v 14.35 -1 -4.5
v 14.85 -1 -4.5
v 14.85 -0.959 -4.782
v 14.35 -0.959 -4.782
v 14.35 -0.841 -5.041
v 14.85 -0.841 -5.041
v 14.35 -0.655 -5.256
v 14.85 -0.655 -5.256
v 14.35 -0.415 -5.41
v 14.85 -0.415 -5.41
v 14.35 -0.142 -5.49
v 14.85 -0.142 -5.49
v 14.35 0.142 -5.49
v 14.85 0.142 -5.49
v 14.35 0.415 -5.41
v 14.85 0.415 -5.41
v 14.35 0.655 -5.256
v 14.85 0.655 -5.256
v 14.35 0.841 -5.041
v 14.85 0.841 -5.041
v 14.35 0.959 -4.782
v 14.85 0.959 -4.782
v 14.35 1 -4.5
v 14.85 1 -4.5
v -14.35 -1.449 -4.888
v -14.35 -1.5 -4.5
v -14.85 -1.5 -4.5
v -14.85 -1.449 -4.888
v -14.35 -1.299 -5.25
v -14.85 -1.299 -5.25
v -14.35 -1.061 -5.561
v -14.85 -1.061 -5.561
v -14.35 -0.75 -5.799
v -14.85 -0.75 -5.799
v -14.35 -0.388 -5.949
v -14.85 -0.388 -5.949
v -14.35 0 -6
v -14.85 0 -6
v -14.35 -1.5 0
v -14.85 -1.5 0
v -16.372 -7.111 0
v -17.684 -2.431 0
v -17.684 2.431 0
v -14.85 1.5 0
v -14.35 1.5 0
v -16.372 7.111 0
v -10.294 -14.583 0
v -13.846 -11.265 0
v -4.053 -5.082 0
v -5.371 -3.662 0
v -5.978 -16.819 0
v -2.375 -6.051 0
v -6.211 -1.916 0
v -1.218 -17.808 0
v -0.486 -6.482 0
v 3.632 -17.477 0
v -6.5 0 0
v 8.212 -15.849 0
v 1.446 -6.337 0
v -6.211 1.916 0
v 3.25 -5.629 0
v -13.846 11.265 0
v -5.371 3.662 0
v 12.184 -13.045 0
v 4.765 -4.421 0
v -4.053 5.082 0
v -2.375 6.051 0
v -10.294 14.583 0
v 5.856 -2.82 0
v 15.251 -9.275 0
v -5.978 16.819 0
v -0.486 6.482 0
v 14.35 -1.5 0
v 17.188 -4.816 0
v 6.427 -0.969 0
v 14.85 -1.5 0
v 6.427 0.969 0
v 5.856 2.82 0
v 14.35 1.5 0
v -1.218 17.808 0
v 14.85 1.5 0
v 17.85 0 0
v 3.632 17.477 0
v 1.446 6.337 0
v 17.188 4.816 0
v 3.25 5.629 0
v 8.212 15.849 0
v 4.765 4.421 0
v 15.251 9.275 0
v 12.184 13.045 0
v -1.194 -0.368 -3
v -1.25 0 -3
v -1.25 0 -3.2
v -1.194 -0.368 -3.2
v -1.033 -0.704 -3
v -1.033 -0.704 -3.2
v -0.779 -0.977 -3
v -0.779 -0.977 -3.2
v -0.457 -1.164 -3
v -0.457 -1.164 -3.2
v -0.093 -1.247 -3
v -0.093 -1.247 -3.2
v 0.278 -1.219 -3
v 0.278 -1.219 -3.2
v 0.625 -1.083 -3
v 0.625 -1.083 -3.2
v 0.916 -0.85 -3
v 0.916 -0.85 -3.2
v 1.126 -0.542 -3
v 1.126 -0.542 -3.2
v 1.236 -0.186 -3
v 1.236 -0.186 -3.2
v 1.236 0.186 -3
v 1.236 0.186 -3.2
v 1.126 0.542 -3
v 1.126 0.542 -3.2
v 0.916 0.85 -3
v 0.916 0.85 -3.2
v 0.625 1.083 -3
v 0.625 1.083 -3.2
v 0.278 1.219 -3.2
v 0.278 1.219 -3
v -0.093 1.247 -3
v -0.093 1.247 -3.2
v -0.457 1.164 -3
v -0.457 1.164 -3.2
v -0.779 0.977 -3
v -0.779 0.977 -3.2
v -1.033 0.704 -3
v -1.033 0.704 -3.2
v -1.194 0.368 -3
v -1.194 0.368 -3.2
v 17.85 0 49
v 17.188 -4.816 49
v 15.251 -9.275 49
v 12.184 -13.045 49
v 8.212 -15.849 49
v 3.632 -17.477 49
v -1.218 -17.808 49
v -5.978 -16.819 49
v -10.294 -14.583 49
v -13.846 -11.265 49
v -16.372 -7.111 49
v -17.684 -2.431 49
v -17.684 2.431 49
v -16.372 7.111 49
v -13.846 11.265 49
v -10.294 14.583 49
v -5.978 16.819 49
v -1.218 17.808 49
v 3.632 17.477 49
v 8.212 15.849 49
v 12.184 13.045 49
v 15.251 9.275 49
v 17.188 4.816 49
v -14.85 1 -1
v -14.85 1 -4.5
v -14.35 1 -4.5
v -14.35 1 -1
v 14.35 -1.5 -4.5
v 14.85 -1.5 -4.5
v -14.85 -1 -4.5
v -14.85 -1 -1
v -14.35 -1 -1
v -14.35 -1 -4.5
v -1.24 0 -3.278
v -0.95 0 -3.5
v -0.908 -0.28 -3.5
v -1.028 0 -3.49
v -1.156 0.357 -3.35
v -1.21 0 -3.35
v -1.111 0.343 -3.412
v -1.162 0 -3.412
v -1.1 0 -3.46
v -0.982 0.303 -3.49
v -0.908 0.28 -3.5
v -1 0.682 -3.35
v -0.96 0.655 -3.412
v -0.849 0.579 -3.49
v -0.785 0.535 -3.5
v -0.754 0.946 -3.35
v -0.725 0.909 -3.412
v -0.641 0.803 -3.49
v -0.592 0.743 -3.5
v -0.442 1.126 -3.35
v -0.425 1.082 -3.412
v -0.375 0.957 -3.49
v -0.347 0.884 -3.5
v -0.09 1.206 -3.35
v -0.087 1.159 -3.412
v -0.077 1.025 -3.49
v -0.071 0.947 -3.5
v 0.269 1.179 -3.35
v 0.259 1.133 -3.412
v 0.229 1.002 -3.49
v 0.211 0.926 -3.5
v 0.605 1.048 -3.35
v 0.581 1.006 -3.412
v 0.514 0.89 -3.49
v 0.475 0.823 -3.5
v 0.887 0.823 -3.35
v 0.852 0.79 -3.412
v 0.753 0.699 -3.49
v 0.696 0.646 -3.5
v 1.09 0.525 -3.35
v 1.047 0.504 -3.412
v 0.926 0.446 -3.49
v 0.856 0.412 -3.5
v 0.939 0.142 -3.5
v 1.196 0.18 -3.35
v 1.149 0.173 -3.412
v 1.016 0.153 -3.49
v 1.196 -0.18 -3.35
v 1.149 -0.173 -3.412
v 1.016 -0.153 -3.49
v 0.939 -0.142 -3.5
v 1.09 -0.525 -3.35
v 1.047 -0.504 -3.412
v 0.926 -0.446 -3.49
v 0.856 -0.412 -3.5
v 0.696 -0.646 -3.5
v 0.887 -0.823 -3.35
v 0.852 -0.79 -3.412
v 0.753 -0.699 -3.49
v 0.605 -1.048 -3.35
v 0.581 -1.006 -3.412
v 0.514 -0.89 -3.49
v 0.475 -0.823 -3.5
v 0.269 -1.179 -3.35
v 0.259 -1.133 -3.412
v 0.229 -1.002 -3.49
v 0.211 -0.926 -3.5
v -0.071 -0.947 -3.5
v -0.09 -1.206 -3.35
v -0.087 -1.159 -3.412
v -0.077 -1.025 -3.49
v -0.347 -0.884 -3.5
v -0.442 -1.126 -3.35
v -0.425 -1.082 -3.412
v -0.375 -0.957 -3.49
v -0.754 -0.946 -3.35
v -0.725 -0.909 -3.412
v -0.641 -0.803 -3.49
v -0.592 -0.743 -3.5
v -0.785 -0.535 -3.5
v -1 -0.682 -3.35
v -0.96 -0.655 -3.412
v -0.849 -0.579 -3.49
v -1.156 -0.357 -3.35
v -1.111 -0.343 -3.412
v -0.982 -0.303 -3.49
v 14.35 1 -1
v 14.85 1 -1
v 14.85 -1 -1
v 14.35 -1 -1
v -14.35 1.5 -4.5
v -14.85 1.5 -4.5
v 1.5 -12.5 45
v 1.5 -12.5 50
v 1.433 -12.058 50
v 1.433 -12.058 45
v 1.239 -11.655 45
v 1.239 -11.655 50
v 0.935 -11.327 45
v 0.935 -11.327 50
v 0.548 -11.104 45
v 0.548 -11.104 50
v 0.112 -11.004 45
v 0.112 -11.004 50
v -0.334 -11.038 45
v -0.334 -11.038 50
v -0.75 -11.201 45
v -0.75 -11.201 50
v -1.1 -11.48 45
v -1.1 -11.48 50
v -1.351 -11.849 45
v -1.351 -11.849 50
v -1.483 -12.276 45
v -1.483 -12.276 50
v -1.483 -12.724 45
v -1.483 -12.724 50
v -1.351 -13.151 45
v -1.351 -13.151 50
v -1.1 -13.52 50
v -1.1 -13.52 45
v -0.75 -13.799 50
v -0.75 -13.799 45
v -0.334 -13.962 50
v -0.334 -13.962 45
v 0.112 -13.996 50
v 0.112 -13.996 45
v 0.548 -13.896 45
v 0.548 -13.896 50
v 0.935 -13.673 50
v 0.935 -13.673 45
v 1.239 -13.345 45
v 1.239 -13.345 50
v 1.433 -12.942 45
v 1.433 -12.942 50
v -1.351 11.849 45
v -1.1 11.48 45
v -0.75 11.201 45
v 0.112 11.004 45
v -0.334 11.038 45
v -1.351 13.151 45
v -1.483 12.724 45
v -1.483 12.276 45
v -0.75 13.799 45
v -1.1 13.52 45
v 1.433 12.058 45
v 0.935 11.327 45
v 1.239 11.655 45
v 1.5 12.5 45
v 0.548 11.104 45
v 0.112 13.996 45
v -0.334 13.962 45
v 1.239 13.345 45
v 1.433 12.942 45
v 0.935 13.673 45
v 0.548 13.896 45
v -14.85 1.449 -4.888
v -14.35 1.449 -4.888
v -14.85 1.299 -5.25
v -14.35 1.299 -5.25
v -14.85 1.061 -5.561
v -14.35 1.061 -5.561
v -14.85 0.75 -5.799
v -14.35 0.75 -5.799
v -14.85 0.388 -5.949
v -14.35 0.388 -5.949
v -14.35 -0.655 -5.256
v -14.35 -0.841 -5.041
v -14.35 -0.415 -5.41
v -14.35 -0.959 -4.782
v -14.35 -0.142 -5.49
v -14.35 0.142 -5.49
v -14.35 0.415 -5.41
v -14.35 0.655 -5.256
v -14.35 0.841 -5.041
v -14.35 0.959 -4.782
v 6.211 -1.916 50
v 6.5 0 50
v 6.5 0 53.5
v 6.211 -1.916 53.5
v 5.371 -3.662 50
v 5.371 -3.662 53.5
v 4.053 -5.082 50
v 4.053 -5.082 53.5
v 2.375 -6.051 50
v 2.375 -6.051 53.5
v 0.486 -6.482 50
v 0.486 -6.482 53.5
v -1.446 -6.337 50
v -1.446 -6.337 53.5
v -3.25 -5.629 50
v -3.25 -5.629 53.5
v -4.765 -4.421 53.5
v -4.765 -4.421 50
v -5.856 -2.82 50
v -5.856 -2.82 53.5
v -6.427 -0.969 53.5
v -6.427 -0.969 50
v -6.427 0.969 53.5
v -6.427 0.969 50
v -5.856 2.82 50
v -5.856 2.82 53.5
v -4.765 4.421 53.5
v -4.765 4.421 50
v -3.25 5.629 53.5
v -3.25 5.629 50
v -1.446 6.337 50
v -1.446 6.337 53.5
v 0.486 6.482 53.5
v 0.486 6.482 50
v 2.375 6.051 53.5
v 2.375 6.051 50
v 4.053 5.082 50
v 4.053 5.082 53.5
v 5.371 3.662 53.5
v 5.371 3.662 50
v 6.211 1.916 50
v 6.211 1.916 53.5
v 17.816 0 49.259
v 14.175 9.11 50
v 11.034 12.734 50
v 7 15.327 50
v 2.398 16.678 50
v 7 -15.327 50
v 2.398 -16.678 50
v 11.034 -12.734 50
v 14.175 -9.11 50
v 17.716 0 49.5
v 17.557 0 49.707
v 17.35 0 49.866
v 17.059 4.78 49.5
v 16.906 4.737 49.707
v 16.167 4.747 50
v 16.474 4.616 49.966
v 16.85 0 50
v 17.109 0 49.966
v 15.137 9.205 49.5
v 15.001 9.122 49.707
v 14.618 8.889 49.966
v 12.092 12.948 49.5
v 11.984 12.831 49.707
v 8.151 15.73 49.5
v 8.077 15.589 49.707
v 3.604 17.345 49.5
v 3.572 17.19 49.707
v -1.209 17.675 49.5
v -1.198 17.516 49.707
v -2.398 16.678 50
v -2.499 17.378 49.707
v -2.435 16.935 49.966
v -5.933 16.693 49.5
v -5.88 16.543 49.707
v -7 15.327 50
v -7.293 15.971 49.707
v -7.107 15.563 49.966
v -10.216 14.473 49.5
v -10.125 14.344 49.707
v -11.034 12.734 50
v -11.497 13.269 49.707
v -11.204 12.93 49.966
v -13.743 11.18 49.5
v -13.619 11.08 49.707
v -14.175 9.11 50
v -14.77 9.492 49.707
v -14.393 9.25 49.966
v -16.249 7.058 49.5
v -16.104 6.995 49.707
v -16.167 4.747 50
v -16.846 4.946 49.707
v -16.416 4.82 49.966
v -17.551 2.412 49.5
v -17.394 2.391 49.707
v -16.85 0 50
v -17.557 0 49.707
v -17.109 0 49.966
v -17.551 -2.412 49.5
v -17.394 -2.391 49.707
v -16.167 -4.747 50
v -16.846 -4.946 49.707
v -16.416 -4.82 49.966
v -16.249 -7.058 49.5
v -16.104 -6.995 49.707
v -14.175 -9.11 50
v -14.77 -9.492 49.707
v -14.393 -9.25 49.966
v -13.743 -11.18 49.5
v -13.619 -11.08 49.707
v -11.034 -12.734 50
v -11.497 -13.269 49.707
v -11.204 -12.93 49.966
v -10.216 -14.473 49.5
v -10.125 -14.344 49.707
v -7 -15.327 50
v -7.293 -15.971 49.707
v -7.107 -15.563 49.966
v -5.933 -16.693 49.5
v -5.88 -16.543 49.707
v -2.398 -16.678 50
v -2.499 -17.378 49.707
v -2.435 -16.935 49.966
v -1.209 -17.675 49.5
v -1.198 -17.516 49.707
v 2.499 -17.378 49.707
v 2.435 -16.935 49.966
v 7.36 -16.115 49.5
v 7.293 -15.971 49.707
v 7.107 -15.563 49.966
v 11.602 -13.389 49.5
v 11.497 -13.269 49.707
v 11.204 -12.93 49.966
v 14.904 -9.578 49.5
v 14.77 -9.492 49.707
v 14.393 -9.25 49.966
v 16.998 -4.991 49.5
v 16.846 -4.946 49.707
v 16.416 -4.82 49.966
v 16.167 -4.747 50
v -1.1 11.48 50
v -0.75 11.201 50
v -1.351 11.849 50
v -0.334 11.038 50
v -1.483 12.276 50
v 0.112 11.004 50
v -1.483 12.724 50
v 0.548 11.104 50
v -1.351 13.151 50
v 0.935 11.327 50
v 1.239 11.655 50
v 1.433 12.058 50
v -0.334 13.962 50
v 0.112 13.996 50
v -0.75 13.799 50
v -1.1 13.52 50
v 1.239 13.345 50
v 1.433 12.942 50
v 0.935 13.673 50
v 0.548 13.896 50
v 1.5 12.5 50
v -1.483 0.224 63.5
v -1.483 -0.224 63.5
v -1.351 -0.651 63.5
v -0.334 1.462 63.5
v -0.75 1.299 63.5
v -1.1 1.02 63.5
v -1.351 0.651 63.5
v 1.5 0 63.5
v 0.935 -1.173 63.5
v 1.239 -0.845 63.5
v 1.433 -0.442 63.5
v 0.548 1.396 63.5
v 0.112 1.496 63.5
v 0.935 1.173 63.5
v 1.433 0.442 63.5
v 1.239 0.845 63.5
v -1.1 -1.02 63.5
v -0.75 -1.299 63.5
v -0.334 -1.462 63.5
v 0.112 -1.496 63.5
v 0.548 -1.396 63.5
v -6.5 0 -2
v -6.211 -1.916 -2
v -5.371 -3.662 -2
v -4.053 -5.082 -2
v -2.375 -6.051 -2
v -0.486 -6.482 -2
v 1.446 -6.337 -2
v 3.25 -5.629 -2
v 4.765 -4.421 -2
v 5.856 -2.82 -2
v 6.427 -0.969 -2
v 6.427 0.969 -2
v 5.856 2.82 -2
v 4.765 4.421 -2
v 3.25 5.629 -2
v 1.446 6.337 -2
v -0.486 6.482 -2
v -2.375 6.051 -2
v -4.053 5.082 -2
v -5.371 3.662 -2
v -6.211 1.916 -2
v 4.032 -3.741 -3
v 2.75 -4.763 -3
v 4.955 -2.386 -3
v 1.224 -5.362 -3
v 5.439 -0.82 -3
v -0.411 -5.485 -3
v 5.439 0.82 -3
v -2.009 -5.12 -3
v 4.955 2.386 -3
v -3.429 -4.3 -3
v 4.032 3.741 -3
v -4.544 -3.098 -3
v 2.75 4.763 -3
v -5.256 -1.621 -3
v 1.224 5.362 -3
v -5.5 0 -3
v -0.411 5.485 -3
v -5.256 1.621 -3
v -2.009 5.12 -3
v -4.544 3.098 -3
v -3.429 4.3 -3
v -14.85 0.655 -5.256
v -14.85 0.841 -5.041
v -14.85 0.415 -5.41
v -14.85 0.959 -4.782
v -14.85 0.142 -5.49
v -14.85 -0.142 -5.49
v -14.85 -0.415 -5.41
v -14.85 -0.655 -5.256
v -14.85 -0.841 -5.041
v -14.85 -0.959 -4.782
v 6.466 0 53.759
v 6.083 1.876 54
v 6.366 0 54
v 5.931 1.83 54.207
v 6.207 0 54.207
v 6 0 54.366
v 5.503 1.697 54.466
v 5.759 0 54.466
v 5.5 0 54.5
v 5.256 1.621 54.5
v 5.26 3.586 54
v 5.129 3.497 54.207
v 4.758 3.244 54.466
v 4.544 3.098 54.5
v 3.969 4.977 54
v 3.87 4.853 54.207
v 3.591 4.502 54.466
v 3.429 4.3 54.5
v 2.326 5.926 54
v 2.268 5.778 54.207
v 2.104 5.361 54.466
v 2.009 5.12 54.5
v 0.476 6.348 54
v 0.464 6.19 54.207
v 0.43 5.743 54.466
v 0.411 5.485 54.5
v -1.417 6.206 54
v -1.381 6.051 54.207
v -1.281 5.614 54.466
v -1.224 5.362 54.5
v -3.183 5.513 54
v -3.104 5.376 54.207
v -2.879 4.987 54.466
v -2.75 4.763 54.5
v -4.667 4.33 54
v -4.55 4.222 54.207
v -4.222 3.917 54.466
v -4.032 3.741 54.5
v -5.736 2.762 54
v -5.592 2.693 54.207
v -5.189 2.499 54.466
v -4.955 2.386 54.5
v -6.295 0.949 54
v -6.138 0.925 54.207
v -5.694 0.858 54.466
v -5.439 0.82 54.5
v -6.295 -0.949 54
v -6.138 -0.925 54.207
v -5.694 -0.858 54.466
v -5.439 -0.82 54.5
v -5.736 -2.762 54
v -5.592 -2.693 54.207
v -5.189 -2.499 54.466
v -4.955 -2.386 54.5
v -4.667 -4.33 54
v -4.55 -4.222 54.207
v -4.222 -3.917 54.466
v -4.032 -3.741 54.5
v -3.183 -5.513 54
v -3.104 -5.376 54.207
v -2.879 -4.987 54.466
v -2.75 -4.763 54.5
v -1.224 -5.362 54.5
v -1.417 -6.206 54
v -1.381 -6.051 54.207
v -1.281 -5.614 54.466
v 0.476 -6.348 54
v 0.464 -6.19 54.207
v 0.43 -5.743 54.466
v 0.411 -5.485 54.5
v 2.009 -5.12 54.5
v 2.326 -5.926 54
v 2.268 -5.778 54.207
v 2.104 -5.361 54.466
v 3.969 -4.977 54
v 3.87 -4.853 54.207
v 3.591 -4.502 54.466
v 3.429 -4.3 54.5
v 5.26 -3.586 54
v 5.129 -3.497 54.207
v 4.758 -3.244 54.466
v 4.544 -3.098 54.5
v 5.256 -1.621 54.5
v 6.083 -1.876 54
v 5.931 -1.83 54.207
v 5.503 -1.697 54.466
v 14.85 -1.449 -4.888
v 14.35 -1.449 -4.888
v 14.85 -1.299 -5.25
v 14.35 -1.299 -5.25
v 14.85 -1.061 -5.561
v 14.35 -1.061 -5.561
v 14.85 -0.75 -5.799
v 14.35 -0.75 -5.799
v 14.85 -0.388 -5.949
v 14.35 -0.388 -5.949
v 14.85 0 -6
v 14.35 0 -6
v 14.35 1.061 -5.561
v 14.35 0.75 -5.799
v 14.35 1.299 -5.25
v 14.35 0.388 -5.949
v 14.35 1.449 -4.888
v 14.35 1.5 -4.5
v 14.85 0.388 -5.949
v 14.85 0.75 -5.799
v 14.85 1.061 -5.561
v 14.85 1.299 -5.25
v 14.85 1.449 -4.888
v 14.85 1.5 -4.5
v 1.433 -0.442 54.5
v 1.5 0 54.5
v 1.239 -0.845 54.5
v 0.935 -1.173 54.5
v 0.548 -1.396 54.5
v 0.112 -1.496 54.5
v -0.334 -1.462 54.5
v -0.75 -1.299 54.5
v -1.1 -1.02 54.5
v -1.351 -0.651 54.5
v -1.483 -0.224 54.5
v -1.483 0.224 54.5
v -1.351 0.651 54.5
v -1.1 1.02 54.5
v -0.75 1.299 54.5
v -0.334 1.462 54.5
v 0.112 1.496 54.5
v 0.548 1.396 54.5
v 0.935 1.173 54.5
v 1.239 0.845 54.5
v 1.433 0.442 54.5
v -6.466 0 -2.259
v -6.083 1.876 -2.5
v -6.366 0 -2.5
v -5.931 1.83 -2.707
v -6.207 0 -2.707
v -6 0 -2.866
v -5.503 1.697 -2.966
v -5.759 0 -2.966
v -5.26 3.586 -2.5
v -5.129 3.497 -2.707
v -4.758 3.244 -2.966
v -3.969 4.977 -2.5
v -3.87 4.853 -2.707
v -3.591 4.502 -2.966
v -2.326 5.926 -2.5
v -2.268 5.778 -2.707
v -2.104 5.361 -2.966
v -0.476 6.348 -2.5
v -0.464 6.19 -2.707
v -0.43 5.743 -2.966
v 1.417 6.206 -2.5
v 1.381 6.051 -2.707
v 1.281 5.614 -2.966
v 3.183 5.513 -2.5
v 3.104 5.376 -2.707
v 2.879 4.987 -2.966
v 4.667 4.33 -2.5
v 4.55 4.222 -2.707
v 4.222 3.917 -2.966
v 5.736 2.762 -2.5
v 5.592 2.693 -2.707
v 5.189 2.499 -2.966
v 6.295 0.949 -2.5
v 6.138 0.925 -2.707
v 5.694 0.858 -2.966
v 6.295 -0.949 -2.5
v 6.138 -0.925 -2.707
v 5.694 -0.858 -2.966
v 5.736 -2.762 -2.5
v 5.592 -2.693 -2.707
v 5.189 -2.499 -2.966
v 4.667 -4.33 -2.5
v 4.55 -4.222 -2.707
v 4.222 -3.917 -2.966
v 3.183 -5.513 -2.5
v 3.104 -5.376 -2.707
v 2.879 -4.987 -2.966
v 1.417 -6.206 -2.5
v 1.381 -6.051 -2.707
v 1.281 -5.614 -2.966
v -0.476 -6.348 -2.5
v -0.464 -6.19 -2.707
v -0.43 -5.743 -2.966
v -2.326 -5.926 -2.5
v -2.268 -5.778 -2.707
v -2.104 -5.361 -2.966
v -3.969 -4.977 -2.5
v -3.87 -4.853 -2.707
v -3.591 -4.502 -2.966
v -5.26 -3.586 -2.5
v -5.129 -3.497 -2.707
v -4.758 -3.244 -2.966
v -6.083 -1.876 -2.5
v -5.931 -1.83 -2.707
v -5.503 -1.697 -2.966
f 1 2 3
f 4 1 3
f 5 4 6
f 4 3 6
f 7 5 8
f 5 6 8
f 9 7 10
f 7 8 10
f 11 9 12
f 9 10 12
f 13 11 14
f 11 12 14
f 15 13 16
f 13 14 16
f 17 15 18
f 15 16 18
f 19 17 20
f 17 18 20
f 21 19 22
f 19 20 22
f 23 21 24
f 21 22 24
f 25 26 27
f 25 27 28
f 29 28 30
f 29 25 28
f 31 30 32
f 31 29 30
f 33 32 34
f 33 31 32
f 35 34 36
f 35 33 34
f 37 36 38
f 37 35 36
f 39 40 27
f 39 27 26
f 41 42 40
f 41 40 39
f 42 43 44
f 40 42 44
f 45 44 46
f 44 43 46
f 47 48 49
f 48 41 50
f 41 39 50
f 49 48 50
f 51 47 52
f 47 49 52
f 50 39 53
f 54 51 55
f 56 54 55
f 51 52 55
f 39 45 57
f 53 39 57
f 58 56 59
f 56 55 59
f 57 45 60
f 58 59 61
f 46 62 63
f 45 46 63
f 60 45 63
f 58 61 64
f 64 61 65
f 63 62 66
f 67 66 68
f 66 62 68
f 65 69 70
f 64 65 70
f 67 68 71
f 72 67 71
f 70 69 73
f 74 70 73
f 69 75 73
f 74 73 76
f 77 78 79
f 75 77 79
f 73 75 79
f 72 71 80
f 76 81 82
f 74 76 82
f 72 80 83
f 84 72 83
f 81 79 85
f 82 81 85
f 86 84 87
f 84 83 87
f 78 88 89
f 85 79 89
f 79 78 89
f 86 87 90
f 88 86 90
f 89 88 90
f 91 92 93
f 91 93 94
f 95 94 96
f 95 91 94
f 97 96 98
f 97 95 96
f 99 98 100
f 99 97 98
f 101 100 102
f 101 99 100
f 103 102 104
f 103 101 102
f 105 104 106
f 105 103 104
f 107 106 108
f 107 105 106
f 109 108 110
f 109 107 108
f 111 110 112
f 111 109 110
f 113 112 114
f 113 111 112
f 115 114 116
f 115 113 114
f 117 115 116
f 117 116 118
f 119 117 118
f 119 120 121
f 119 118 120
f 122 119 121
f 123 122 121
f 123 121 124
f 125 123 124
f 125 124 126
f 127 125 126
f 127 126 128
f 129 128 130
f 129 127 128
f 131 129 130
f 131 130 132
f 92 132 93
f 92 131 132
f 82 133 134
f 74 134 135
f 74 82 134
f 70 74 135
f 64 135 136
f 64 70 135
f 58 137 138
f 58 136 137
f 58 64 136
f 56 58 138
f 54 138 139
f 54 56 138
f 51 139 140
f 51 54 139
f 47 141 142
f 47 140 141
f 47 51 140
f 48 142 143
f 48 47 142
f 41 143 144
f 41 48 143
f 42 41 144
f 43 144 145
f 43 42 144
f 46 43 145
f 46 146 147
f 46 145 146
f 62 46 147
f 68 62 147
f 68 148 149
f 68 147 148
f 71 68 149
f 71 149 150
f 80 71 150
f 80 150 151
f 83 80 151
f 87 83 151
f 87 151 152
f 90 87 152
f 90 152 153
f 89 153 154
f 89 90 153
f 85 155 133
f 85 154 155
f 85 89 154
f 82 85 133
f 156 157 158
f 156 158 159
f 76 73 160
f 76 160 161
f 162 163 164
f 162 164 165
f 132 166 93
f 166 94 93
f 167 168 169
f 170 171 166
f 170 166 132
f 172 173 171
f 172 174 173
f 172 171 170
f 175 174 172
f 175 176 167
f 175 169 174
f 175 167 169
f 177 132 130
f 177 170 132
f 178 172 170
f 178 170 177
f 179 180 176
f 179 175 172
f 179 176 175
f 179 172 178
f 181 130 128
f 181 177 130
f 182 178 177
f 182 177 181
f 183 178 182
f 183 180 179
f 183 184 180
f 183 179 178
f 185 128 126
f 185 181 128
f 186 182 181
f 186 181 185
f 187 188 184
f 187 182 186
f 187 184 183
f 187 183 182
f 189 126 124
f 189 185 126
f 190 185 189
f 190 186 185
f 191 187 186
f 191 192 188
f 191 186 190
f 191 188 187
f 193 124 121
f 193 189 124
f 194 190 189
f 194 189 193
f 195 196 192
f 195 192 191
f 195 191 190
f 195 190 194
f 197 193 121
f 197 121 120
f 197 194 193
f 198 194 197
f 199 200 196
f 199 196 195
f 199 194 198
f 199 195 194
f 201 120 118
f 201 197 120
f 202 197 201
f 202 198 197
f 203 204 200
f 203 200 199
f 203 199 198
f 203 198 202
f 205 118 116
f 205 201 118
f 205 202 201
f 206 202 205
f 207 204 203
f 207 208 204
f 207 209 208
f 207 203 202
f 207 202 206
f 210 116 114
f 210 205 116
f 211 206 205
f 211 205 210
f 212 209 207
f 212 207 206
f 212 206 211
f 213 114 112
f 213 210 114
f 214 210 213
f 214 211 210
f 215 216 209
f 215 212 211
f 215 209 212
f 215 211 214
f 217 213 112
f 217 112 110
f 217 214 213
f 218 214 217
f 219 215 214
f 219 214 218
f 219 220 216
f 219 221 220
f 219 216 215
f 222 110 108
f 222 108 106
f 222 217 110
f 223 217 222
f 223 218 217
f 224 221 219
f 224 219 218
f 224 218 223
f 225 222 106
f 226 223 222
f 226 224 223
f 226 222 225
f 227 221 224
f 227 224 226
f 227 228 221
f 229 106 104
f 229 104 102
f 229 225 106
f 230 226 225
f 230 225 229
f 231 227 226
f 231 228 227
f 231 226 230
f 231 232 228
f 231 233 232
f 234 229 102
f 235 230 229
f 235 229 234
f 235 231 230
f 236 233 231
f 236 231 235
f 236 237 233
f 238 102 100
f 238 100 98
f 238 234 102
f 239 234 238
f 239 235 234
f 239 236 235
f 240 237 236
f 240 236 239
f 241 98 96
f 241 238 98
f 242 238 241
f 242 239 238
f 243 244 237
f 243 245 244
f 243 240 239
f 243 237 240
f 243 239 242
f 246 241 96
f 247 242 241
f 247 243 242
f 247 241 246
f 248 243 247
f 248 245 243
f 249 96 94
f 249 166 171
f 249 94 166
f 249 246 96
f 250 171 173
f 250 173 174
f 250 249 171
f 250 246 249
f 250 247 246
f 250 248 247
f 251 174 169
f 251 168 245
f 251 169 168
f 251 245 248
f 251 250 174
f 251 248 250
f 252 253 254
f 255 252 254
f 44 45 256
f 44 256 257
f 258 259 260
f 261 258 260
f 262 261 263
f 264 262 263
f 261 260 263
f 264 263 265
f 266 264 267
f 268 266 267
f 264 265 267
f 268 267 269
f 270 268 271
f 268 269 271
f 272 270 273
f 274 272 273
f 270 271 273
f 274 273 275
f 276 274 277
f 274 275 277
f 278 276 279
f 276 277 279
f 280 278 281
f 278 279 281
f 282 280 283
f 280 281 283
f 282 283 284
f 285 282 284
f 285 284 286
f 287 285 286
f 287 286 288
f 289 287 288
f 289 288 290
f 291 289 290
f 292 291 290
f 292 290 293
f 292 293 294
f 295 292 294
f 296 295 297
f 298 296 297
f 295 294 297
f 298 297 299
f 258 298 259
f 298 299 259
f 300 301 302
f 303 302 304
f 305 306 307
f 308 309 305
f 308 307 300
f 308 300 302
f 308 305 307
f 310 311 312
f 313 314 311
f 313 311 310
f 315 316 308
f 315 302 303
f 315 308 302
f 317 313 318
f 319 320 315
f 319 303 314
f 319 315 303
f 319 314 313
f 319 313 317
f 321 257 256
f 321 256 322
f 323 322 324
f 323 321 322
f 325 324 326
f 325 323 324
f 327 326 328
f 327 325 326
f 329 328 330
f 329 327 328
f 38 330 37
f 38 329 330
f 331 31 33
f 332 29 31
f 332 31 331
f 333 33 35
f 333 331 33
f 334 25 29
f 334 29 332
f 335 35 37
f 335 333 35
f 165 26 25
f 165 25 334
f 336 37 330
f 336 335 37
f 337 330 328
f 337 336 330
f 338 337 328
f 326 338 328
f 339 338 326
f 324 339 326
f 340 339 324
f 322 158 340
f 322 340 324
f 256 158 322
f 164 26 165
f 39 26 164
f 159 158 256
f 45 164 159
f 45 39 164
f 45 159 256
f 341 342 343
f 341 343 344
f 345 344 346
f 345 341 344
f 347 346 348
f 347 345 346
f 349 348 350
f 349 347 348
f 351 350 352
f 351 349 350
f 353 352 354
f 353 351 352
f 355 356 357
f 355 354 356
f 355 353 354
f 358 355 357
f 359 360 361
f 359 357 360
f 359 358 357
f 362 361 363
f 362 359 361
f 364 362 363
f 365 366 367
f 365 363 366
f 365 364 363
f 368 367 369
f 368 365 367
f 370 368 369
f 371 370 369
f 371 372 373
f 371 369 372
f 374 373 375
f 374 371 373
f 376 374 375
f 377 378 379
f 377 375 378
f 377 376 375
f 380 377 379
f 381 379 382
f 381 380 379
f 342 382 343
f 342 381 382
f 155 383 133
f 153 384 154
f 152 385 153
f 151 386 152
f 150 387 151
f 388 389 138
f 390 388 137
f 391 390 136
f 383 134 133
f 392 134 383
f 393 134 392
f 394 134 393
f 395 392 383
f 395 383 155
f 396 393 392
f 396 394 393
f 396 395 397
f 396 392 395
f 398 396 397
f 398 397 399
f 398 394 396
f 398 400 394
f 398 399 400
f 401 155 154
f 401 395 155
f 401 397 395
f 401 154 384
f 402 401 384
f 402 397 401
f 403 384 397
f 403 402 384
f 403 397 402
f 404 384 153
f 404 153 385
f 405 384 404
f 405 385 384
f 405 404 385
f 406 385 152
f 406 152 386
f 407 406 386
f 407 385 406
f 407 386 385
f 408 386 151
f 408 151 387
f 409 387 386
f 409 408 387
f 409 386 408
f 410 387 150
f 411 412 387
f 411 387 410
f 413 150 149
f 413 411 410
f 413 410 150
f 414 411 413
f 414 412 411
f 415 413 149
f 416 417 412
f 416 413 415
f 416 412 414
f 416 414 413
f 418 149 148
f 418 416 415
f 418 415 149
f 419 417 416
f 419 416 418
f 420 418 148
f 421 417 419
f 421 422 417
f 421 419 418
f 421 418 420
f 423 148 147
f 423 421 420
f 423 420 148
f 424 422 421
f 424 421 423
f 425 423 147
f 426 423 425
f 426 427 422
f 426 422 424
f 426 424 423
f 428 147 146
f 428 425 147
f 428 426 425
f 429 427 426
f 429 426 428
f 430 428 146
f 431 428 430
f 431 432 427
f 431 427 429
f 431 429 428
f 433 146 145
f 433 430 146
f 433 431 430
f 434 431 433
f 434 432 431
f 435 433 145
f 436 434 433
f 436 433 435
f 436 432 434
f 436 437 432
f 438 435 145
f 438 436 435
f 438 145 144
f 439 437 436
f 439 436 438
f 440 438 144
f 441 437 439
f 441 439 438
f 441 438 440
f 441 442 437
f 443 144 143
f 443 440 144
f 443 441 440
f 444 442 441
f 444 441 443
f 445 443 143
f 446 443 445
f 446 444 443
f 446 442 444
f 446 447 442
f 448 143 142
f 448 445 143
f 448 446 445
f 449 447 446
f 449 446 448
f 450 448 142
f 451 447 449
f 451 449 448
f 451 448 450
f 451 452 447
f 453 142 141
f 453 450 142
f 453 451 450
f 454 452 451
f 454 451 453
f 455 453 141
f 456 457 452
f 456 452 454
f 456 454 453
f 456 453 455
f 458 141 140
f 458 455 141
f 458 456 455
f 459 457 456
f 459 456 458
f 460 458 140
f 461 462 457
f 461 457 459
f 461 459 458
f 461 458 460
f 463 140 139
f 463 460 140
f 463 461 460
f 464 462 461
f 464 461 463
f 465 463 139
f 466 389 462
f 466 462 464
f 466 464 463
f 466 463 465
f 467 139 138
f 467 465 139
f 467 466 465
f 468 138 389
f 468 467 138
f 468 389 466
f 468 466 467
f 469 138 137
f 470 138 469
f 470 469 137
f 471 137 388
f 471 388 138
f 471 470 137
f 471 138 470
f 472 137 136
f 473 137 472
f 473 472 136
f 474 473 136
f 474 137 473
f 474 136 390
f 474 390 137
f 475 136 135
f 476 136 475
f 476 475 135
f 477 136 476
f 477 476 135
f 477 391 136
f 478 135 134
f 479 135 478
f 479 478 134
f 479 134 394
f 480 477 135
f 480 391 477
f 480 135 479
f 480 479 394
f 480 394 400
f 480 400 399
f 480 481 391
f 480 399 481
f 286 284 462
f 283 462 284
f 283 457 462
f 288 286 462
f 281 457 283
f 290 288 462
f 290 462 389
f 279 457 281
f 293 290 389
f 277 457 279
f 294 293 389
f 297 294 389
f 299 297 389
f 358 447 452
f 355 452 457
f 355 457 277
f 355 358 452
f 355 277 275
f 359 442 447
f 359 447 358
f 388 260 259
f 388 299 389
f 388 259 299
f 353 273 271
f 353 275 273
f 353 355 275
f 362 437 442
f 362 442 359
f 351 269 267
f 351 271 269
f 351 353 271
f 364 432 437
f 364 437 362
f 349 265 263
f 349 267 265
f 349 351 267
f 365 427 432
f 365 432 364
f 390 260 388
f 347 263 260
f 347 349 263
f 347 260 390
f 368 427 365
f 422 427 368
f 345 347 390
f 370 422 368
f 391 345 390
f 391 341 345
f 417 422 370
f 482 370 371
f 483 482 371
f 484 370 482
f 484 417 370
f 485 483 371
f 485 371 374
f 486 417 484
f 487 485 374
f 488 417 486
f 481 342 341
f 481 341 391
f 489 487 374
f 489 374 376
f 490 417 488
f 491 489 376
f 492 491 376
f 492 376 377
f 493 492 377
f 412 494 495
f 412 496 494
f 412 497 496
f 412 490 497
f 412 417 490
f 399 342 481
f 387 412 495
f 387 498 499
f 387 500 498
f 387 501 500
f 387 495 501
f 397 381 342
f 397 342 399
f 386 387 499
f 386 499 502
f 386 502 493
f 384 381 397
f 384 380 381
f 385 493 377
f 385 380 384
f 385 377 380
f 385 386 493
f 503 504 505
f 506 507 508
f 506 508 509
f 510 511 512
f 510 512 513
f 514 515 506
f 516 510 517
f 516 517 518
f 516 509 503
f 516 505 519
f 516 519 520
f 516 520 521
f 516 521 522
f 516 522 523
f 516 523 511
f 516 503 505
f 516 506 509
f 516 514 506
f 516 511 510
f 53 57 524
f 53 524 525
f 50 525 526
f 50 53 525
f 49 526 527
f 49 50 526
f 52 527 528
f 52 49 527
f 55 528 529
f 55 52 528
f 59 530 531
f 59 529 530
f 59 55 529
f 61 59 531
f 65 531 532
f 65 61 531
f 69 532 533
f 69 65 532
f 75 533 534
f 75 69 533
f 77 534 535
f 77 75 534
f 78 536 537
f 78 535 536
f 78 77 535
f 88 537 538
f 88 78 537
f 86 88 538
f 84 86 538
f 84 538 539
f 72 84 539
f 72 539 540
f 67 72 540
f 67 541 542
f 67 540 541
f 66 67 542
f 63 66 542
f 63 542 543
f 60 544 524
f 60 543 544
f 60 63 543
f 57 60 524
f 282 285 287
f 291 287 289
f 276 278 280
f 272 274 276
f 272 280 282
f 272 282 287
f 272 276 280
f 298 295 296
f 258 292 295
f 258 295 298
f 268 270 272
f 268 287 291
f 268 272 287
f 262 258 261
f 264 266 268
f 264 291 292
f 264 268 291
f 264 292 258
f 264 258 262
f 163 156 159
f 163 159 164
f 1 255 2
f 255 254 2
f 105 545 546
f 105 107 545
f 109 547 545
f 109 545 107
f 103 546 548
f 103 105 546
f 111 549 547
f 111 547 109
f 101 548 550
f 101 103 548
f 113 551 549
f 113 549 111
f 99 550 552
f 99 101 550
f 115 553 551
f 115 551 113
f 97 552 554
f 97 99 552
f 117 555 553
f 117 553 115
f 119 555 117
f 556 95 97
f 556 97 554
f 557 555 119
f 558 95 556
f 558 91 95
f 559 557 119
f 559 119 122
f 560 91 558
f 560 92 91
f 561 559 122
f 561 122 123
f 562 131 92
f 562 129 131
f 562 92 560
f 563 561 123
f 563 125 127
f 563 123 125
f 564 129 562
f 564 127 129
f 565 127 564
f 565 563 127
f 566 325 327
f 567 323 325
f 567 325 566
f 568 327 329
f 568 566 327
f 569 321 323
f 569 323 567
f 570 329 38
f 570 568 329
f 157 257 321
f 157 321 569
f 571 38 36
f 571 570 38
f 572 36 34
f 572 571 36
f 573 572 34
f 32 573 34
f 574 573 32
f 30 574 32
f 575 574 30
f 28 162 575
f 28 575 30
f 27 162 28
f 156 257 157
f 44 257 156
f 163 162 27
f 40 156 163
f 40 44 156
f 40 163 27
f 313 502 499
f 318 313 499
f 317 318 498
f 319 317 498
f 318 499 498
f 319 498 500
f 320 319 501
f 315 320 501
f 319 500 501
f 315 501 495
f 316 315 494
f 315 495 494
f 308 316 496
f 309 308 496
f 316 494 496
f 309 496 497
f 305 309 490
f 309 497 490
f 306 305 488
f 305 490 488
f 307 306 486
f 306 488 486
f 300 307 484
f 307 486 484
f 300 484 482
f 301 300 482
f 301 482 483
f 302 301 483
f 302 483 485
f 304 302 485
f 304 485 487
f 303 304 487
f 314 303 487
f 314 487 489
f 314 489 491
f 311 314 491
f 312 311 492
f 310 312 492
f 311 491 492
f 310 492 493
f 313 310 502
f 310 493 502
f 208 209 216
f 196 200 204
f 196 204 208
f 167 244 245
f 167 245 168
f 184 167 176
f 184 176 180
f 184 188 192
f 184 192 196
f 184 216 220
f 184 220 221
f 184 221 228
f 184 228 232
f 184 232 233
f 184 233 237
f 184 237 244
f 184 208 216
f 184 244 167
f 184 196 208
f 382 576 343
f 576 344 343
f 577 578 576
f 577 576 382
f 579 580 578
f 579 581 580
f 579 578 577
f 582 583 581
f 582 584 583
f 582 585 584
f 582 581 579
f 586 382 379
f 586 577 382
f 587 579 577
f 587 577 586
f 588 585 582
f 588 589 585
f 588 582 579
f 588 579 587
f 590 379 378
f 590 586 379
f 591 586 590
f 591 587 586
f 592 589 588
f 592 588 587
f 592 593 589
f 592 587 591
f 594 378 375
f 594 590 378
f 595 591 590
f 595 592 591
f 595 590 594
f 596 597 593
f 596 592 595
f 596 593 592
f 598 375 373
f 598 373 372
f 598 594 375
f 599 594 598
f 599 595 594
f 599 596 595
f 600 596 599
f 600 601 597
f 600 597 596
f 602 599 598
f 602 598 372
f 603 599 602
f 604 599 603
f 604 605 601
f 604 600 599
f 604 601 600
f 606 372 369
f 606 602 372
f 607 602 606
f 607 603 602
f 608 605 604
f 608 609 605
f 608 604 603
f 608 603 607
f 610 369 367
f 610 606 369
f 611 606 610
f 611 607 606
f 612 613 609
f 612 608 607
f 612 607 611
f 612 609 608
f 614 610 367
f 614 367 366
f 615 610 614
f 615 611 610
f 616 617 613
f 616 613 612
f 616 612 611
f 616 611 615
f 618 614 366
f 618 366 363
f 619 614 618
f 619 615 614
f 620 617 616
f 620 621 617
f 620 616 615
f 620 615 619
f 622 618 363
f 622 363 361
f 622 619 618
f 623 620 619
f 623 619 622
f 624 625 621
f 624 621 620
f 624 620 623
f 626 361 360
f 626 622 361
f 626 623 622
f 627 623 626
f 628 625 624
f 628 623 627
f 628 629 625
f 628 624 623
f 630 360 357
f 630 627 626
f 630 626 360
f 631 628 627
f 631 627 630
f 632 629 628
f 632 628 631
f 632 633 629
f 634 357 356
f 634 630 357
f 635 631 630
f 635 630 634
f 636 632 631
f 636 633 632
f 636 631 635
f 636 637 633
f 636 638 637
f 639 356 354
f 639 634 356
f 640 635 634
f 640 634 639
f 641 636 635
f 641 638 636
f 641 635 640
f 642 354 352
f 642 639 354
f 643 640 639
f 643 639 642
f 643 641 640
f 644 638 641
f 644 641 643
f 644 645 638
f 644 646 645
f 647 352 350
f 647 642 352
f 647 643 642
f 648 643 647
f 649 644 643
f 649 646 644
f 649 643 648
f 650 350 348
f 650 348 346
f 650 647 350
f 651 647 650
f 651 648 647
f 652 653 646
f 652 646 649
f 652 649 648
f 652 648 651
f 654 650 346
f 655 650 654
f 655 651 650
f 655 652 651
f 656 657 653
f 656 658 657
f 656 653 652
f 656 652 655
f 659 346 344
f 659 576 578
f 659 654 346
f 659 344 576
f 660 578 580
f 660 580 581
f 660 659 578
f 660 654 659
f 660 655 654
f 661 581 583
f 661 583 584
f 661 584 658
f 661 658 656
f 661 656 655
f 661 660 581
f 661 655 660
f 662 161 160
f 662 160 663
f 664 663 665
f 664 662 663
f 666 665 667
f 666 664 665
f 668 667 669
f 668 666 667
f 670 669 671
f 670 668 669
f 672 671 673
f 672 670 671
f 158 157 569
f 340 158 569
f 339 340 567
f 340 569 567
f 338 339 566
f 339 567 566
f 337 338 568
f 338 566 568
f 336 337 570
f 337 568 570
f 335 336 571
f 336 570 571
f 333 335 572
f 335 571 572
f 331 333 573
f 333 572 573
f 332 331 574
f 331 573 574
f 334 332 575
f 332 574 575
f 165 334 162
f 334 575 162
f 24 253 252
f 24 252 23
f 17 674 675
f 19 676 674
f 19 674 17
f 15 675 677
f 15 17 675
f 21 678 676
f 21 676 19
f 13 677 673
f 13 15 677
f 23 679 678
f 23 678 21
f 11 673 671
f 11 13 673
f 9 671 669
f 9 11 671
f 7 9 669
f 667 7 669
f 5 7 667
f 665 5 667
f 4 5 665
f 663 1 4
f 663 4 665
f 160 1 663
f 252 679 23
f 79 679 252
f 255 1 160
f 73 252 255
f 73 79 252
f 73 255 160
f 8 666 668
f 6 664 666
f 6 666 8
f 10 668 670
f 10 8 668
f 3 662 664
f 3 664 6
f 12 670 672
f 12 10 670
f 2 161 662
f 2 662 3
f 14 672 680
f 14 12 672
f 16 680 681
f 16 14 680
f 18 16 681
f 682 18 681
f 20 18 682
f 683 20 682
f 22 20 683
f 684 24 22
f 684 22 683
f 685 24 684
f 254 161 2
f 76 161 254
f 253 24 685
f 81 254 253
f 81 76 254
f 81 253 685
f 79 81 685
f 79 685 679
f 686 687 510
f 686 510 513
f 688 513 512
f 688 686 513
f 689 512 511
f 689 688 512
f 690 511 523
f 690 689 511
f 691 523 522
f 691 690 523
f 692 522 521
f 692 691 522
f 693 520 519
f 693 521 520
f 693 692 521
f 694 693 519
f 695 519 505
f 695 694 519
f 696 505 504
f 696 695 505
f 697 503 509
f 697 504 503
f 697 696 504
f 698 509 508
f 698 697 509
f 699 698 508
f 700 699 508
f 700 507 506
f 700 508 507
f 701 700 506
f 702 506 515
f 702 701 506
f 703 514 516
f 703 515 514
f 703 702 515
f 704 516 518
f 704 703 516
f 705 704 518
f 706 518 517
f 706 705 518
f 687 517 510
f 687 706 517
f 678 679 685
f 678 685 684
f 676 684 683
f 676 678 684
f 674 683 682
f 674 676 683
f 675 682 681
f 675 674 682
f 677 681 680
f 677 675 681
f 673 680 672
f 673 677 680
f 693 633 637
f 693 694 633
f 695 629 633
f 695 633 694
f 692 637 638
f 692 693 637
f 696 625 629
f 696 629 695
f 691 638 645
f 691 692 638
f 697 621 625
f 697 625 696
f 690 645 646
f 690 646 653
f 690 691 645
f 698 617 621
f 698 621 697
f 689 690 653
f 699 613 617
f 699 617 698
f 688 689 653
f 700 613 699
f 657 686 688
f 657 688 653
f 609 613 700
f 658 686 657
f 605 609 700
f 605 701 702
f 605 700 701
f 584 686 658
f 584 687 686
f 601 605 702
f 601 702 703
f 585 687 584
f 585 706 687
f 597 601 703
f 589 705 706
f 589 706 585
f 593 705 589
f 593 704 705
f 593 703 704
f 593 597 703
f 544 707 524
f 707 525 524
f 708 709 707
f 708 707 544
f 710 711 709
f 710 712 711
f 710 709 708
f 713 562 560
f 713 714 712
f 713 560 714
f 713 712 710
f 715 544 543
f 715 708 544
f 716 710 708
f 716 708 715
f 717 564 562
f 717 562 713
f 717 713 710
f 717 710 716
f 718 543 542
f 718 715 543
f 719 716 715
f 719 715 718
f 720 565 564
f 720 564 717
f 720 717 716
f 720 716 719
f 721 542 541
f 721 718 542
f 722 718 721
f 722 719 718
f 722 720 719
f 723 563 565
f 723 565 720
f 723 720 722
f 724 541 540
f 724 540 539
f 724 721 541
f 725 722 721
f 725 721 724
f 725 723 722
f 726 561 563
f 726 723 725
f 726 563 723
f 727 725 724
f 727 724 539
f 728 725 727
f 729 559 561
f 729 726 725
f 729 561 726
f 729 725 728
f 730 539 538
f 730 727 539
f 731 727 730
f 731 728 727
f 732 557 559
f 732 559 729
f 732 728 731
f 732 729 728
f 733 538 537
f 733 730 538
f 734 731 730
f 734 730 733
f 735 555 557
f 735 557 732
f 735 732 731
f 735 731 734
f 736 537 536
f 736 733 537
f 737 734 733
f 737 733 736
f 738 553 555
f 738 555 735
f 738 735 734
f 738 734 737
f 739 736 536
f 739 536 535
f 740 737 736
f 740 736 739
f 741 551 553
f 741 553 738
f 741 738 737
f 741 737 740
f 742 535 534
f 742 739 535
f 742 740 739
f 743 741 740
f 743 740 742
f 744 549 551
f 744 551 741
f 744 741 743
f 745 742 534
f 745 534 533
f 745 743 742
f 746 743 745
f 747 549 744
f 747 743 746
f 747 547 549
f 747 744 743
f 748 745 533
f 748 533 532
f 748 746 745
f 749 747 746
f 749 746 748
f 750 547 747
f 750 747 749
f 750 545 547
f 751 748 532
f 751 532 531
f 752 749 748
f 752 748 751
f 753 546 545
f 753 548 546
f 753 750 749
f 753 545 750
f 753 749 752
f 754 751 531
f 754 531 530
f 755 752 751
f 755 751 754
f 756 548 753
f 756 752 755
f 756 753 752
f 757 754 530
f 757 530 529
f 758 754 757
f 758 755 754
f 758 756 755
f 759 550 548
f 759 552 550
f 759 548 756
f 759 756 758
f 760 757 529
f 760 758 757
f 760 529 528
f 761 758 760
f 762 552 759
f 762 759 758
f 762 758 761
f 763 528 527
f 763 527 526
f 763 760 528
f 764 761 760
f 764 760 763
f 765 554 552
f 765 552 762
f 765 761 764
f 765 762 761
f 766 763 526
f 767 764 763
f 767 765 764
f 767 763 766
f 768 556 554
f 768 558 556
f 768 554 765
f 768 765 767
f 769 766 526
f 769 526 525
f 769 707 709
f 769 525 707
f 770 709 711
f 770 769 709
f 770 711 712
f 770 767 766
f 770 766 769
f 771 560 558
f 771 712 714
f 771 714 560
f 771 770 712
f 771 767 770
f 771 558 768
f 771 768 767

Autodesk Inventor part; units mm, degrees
ref_plane "YZ Plane" through (0, 0, 0) normal (1, 0, 0) x (0, 1, 0)
ref_plane "XZ Plane" through (0, 0, 0) normal (0, 1, 0) x (-1, 0, 0)
ref_plane "XY Plane" through (0, 0, 0) normal (0, 0, 1) x (1, 0, 0)
sketch "Эскиз1" plane through (0, 0, 0) normal (0, 0, 1) x (1, 0, 0)
  circle A0 centre (0, 0) radius 17.85
  dimension "d37" = 35.7
extrude "Выдавливание1" add sketch "Эскиз1" along normal blind 50
sketch "Sketch7" plane through (0, 0, 50) normal (0, 0, 1) x (1, 0, 0)
  circle A0 centre (0, 0) radius 6.5
  dimension "d40" = 13
extrude "Extrusion7" add sketch "Sketch7" along normal blind 4.5
sketch "Sketch8" plane through (0, 0, 54.5) normal (0, 0, 1) x (1, 0, 0)
  circle A0 centre (0, 0) radius 1.5
  dimension "d43" = 3
extrude "Extrusion8" add sketch "Sketch8" along normal blind 9
sketch "Sketch10" plane through (0, 0, 50) normal (0, 0, 1) x (1, 0, 0)
  circle A0 centre (0, 12.5) radius 1.5
  circle A1 centre (0, -12.5) radius 1.5
  point P0 (0, 0)
  dimension "d53" = 3
  dimension "d54" = 3
  dimension "d58" = 12.5
  dimension "d59" = 12.5
extrude "Extrusion9" cut sketch "Sketch10" against normal blind 5
thread "Thread1" size "M3x0.5" class "6H" standard "ANSI Metric M Profile" full length
thread "Thread2" size "M3x0.5" class "6H" standard "ANSI Metric M Profile" full length
sketch "Sketch12" plane through (0, 0, 0) normal (0, 0, -1) x (-1, 0, 0)
  circle A0 centre (0, 0) radius 6.5
  dimension "d67" = 13
extrude "Extrusion10" add sketch "Sketch12" along normal blind 3
sketch "Sketch13" plane through (0, 0, -3) normal (0, 0, -1) x (-1, 0, 0)
  circle A0 centre (0, 0) radius 1.25
  dimension "d70" = 2.5
extrude "Extrusion11" add sketch "Sketch13" along normal blind 0.5
fillet "Fillet3" radius 1 1 edges at (6.5, 0, -3)
fillet "Fillet4" radius 0.3 1 edges at (1.25, 0, -3.5)
fillet "Fillet5" radius 1 1 edges at (-6.5, 0, 54.5)
sketch "Sketch14" plane through (0, 0, 0) normal (0, 0, -1) x (-1, 0, 0)
  line L0 (14.85, -1.5) -> (14.35, -1.5)
  line L1 (14.35, -1.5) -> (14.35, 1.5)
  line L2 (14.35, 1.5) -> (14.85, 1.5)
  line L3 (14.85, 1.5) -> (14.85, -1.5)
  line L4 (-14.35, -1.5) -> (-14.85, -1.5)
  line L5 (-14.85, -1.5) -> (-14.85, 1.5)
  line L6 (-14.85, 1.5) -> (-14.35, 1.5)
  line L7 (-14.35, 1.5) -> (-14.35, -1.5)
  line L8 (0, 0) -> (18.9187, 0)
  circle A0 centre (0, 0) radius 1.5 projected
  line L9 (0, 0) -> (-19.0249, 0)
  dimension "d76" = 0.5
  dimension "d77" = 0.5
  dimension "d78" = 28.7
  dimension "d79" = 14.35
  dimension "d80" = 3
extrude "Extrusion12" add sketch "Sketch14" along normal blind 6 contours L0 L1 L8 L3 | L8 L1 L2 L3 | L4 L5 L9 L7 | L9 L5 L6 L7
fillet "Fillet6" radius 1.5 4 edges at (-14.6, -1.5, -6) (-14.6, 1.5, -6) (14.6, -1.5, -6) (14.6, 1.5, -6)
sketch "Sketch15" plane through (-14.85, -1.5, 0) normal (-1, 0, 0) x (0, 0, 1)
  line L0 (-1, 0.5) -> (-4.5, 0.5)
  line L1 (-4.5, 2.5) -> (-1, 2.5)
  line L2 (-1, 2.5) -> (-1, 0.5)
  line L3 (0, 0) -> (-4.5, 0) projected
  line L4 (0, 3) -> (-4.5, 3) projected
  line L5 (0, -16.35) -> (0, 19.35) projected
  arc A0 (-4.5, 2.5) -> (-4.5, 0.5) centre (-4.5, 1.5) ccw
  point P0 (0, 1.5)
  dimension "d84" = 0.5
  dimension "d85" = 0.5
  dimension "d86" = 1
  dimension "d87" = 3.5
  dimension "d88" = 3.5
  dimension "d89" = 1
extrude "Extrusion13" cut sketch "Sketch15" against normal blind 1
sketch "Sketch16" plane through (14.85, -1.5, 0) normal (1, 0, 0) x (0, 0, -1)
  line L0 (1, 2.5) -> (1, 0.5) projected
  line L1 (1, 2.5) -> (4.5, 2.5) projected
  line L2 (1, 0.5) -> (4.5, 0.5)
  line L3 (4.5, 2.5) -> (1, 2.5)
  line L4 (1, 2.5) -> (1, 0.5)
  arc A0 (4.5, 0.5) -> (4.5, 2.5) centre (4.5, 1.5) ccw projected
  arc A1 (4.5, 0.5) -> (4.5, 2.5) centre (4.5, 1.5) ccw
  point P0 (0, 1.5)
  dimension "d92" = 1
extrude "Extrusion14" cut sketch "Sketch16" against normal blind 1
fillet "Fillet7" radius 1 1 edges at (-17.85, 0, 50)
properties part number "R370-25120" material "Stainless Steel, 440C"
